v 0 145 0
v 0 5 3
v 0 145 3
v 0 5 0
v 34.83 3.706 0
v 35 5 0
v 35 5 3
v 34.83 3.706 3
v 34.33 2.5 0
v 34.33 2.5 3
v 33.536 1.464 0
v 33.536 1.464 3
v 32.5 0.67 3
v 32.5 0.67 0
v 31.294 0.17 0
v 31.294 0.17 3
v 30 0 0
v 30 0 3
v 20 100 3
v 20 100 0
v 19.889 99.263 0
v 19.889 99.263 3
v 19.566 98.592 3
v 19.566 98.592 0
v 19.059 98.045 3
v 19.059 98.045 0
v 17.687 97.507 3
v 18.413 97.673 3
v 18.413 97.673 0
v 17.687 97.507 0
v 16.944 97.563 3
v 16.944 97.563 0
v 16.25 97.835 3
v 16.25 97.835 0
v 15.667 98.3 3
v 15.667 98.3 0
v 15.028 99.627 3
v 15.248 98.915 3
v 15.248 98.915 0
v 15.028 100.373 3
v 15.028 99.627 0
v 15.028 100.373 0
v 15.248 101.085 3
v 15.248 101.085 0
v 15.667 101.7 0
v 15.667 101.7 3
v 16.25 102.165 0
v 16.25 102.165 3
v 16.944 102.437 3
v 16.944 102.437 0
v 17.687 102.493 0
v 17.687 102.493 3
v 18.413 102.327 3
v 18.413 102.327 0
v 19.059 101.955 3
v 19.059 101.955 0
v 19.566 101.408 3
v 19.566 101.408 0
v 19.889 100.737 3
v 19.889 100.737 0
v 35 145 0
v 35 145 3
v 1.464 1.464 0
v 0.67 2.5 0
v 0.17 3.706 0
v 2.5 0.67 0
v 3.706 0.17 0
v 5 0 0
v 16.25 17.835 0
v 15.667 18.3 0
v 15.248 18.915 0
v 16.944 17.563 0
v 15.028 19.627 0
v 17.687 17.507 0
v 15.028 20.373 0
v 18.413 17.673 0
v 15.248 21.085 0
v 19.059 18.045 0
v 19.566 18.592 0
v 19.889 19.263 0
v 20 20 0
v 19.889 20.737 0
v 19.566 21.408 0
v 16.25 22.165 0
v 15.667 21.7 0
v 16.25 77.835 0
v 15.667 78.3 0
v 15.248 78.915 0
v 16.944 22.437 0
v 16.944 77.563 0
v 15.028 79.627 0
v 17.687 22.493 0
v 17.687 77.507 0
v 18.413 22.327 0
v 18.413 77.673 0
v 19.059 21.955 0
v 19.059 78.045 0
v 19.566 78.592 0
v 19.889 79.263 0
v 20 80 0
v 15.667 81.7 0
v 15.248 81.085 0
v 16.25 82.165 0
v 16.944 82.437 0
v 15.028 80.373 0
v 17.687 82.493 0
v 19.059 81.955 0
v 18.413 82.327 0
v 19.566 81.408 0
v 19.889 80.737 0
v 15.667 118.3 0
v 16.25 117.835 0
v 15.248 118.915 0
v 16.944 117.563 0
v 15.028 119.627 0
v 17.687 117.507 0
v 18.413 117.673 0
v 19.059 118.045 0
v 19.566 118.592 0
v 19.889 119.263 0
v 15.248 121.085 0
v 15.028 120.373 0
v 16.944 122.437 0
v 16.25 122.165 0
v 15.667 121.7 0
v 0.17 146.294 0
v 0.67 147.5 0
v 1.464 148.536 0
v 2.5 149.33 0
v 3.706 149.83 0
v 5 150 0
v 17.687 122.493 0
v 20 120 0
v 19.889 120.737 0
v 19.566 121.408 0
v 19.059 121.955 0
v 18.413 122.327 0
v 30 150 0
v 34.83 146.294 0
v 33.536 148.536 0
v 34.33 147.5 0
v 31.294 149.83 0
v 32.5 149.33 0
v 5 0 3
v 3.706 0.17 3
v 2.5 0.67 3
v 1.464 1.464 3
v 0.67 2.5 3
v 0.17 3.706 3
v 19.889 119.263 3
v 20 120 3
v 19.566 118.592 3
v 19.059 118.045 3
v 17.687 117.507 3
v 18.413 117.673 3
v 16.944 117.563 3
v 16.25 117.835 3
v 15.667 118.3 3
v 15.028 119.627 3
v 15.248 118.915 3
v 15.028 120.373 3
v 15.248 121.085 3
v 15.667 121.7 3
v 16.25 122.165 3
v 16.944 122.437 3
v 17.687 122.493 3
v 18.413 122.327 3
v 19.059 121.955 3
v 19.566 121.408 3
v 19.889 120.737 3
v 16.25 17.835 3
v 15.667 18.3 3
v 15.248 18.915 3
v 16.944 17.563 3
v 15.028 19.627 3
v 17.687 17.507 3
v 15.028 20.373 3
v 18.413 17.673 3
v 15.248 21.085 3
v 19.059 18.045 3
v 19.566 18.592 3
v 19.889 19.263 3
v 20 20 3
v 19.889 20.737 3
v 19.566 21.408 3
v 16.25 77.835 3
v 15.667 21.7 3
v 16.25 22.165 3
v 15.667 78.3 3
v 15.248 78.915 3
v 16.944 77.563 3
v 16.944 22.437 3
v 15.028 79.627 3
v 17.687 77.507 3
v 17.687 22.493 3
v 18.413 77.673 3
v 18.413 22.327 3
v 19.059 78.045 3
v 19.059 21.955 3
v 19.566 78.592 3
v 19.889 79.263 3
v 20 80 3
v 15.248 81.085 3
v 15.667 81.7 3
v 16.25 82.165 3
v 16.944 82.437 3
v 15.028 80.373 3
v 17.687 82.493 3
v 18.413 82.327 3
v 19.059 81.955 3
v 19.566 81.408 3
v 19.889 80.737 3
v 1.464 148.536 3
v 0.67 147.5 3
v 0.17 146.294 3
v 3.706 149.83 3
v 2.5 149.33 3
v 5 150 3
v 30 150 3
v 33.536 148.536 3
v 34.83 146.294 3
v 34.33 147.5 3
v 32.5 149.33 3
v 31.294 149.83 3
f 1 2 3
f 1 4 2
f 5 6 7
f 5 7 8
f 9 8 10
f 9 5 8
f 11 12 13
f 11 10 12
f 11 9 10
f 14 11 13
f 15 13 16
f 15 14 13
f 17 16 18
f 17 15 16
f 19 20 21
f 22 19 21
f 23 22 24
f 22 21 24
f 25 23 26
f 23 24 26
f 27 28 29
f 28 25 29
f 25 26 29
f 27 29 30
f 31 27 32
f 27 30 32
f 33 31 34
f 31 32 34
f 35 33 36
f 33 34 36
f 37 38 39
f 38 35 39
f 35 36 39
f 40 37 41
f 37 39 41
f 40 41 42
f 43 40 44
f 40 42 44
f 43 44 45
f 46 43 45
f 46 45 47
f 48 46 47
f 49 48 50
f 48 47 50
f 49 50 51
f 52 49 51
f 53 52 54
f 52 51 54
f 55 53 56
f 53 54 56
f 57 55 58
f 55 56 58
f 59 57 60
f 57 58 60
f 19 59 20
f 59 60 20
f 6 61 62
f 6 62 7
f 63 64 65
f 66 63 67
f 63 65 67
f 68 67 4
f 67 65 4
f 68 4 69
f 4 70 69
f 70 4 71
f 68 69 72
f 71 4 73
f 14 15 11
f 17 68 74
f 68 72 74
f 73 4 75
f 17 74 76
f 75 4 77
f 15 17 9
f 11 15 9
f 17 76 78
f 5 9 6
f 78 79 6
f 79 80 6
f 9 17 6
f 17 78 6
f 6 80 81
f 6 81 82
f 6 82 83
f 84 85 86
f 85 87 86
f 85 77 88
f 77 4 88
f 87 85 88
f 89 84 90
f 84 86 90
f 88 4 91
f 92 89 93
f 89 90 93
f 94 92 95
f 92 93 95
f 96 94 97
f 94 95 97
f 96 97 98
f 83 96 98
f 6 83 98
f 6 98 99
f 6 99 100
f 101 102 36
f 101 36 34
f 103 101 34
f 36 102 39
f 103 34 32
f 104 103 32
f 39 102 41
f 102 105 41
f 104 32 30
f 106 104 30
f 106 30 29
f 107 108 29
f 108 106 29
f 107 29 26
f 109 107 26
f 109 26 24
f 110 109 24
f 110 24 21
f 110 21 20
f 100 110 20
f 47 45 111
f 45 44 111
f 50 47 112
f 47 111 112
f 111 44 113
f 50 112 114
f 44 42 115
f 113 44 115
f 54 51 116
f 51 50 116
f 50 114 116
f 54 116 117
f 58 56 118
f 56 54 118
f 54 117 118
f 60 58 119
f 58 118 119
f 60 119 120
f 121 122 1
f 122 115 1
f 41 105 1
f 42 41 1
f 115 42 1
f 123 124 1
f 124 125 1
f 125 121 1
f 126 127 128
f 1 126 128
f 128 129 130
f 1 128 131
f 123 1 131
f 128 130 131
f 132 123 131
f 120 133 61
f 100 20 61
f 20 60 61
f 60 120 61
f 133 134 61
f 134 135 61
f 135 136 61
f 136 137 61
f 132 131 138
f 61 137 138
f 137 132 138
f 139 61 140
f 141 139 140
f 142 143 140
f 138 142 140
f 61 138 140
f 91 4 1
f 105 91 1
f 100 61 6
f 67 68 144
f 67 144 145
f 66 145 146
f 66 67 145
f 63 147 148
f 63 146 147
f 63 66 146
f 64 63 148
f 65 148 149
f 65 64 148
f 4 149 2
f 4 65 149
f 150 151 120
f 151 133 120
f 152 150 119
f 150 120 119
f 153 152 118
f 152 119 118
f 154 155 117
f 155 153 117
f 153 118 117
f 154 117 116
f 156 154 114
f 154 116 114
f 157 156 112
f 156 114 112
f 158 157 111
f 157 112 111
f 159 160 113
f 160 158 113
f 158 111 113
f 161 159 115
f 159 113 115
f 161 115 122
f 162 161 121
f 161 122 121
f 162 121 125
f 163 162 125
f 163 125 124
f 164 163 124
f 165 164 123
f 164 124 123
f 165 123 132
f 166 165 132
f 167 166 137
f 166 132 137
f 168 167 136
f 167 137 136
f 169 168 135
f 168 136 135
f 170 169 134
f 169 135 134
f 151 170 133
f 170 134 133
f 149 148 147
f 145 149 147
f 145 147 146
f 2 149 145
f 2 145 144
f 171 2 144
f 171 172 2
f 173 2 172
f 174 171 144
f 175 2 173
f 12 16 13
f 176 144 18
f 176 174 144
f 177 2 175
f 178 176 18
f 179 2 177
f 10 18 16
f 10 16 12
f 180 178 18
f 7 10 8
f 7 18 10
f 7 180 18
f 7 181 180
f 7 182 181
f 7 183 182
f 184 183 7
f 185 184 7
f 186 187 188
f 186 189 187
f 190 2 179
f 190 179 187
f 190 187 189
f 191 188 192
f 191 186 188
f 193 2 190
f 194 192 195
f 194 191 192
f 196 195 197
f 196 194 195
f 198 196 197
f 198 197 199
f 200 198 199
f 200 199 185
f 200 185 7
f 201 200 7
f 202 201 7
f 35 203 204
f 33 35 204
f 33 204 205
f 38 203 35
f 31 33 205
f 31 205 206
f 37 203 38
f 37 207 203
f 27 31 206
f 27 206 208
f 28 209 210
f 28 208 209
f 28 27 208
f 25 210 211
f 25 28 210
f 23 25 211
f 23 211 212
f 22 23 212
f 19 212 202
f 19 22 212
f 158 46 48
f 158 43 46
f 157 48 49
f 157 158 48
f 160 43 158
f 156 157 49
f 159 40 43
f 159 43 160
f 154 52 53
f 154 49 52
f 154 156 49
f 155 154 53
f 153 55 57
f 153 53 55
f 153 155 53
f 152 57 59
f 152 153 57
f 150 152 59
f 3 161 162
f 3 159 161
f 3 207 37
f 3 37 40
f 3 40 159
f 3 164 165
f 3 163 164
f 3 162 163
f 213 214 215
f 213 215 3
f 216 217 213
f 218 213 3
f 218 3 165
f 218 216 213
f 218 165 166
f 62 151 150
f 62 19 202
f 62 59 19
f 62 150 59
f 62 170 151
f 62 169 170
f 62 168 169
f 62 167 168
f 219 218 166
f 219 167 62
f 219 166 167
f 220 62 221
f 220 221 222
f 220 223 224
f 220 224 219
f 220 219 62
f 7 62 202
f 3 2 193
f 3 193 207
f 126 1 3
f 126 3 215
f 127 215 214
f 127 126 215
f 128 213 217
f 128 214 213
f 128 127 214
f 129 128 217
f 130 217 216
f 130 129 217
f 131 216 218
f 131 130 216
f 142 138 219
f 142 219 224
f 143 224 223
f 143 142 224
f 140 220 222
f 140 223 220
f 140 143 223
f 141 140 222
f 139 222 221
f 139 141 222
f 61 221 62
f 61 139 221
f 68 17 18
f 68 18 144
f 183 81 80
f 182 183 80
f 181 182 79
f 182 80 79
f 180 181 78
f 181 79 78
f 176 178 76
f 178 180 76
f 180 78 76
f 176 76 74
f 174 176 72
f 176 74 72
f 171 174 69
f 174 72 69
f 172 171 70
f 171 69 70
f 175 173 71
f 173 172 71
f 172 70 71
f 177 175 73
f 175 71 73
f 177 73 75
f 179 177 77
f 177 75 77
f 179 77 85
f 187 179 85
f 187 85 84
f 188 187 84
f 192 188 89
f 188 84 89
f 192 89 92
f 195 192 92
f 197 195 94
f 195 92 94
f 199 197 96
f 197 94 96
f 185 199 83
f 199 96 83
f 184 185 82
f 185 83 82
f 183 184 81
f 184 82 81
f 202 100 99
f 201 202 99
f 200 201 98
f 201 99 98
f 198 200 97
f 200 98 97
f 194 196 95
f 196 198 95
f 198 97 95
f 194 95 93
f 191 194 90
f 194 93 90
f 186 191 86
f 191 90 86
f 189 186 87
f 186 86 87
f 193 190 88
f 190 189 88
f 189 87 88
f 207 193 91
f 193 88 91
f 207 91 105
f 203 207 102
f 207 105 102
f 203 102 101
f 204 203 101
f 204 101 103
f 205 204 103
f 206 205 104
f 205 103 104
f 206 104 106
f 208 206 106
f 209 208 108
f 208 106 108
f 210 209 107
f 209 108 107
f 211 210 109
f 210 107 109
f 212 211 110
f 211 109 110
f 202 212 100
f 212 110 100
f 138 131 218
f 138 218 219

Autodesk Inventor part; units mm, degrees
ref_plane "YZ Plane" through (0, 0, 0) normal (1, 0, 0) x (0, 1, 0)
ref_plane "XZ Plane" through (0, 0, 0) normal (0, 1, 0) x (-1, 0, 0)
ref_plane "XY Plane" through (0, 0, 0) normal (0, 0, 1) x (1, 0, 0)
sketch "Boceto1" plane through (0, 0, 0) normal (0, 0, 1) x (1, 0, 0)
  line L0 (0, 5) -> (0, 145)
  line L1 (5, 150) -> (30, 150)
  line L2 (35, 145) -> (35, 5)
  line L3 (30, 0) -> (5, 0)
  arc A0 (35, 145) -> (30, 150) centre (30, 145) ccw
  arc A1 (5, 150) -> (0, 145) centre (5, 145) ccw
  arc A2 (0, 5) -> (5, 0) centre (5, 5) ccw
  arc A3 (30, 0) -> (35, 5) centre (30, 5) ccw
  circle A4 centre (17.5, 120) radius 2.5
  circle A5 centre (17.5, 100) radius 2.5
  circle A6 centre (17.5, 80) radius 2.5
  circle A7 centre (17.5, 20) radius 2.5
  point P0 (0, 0)
extrude "Extrusión1" add sketch "Boceto1" along normal blind 3
properties part number "4"
